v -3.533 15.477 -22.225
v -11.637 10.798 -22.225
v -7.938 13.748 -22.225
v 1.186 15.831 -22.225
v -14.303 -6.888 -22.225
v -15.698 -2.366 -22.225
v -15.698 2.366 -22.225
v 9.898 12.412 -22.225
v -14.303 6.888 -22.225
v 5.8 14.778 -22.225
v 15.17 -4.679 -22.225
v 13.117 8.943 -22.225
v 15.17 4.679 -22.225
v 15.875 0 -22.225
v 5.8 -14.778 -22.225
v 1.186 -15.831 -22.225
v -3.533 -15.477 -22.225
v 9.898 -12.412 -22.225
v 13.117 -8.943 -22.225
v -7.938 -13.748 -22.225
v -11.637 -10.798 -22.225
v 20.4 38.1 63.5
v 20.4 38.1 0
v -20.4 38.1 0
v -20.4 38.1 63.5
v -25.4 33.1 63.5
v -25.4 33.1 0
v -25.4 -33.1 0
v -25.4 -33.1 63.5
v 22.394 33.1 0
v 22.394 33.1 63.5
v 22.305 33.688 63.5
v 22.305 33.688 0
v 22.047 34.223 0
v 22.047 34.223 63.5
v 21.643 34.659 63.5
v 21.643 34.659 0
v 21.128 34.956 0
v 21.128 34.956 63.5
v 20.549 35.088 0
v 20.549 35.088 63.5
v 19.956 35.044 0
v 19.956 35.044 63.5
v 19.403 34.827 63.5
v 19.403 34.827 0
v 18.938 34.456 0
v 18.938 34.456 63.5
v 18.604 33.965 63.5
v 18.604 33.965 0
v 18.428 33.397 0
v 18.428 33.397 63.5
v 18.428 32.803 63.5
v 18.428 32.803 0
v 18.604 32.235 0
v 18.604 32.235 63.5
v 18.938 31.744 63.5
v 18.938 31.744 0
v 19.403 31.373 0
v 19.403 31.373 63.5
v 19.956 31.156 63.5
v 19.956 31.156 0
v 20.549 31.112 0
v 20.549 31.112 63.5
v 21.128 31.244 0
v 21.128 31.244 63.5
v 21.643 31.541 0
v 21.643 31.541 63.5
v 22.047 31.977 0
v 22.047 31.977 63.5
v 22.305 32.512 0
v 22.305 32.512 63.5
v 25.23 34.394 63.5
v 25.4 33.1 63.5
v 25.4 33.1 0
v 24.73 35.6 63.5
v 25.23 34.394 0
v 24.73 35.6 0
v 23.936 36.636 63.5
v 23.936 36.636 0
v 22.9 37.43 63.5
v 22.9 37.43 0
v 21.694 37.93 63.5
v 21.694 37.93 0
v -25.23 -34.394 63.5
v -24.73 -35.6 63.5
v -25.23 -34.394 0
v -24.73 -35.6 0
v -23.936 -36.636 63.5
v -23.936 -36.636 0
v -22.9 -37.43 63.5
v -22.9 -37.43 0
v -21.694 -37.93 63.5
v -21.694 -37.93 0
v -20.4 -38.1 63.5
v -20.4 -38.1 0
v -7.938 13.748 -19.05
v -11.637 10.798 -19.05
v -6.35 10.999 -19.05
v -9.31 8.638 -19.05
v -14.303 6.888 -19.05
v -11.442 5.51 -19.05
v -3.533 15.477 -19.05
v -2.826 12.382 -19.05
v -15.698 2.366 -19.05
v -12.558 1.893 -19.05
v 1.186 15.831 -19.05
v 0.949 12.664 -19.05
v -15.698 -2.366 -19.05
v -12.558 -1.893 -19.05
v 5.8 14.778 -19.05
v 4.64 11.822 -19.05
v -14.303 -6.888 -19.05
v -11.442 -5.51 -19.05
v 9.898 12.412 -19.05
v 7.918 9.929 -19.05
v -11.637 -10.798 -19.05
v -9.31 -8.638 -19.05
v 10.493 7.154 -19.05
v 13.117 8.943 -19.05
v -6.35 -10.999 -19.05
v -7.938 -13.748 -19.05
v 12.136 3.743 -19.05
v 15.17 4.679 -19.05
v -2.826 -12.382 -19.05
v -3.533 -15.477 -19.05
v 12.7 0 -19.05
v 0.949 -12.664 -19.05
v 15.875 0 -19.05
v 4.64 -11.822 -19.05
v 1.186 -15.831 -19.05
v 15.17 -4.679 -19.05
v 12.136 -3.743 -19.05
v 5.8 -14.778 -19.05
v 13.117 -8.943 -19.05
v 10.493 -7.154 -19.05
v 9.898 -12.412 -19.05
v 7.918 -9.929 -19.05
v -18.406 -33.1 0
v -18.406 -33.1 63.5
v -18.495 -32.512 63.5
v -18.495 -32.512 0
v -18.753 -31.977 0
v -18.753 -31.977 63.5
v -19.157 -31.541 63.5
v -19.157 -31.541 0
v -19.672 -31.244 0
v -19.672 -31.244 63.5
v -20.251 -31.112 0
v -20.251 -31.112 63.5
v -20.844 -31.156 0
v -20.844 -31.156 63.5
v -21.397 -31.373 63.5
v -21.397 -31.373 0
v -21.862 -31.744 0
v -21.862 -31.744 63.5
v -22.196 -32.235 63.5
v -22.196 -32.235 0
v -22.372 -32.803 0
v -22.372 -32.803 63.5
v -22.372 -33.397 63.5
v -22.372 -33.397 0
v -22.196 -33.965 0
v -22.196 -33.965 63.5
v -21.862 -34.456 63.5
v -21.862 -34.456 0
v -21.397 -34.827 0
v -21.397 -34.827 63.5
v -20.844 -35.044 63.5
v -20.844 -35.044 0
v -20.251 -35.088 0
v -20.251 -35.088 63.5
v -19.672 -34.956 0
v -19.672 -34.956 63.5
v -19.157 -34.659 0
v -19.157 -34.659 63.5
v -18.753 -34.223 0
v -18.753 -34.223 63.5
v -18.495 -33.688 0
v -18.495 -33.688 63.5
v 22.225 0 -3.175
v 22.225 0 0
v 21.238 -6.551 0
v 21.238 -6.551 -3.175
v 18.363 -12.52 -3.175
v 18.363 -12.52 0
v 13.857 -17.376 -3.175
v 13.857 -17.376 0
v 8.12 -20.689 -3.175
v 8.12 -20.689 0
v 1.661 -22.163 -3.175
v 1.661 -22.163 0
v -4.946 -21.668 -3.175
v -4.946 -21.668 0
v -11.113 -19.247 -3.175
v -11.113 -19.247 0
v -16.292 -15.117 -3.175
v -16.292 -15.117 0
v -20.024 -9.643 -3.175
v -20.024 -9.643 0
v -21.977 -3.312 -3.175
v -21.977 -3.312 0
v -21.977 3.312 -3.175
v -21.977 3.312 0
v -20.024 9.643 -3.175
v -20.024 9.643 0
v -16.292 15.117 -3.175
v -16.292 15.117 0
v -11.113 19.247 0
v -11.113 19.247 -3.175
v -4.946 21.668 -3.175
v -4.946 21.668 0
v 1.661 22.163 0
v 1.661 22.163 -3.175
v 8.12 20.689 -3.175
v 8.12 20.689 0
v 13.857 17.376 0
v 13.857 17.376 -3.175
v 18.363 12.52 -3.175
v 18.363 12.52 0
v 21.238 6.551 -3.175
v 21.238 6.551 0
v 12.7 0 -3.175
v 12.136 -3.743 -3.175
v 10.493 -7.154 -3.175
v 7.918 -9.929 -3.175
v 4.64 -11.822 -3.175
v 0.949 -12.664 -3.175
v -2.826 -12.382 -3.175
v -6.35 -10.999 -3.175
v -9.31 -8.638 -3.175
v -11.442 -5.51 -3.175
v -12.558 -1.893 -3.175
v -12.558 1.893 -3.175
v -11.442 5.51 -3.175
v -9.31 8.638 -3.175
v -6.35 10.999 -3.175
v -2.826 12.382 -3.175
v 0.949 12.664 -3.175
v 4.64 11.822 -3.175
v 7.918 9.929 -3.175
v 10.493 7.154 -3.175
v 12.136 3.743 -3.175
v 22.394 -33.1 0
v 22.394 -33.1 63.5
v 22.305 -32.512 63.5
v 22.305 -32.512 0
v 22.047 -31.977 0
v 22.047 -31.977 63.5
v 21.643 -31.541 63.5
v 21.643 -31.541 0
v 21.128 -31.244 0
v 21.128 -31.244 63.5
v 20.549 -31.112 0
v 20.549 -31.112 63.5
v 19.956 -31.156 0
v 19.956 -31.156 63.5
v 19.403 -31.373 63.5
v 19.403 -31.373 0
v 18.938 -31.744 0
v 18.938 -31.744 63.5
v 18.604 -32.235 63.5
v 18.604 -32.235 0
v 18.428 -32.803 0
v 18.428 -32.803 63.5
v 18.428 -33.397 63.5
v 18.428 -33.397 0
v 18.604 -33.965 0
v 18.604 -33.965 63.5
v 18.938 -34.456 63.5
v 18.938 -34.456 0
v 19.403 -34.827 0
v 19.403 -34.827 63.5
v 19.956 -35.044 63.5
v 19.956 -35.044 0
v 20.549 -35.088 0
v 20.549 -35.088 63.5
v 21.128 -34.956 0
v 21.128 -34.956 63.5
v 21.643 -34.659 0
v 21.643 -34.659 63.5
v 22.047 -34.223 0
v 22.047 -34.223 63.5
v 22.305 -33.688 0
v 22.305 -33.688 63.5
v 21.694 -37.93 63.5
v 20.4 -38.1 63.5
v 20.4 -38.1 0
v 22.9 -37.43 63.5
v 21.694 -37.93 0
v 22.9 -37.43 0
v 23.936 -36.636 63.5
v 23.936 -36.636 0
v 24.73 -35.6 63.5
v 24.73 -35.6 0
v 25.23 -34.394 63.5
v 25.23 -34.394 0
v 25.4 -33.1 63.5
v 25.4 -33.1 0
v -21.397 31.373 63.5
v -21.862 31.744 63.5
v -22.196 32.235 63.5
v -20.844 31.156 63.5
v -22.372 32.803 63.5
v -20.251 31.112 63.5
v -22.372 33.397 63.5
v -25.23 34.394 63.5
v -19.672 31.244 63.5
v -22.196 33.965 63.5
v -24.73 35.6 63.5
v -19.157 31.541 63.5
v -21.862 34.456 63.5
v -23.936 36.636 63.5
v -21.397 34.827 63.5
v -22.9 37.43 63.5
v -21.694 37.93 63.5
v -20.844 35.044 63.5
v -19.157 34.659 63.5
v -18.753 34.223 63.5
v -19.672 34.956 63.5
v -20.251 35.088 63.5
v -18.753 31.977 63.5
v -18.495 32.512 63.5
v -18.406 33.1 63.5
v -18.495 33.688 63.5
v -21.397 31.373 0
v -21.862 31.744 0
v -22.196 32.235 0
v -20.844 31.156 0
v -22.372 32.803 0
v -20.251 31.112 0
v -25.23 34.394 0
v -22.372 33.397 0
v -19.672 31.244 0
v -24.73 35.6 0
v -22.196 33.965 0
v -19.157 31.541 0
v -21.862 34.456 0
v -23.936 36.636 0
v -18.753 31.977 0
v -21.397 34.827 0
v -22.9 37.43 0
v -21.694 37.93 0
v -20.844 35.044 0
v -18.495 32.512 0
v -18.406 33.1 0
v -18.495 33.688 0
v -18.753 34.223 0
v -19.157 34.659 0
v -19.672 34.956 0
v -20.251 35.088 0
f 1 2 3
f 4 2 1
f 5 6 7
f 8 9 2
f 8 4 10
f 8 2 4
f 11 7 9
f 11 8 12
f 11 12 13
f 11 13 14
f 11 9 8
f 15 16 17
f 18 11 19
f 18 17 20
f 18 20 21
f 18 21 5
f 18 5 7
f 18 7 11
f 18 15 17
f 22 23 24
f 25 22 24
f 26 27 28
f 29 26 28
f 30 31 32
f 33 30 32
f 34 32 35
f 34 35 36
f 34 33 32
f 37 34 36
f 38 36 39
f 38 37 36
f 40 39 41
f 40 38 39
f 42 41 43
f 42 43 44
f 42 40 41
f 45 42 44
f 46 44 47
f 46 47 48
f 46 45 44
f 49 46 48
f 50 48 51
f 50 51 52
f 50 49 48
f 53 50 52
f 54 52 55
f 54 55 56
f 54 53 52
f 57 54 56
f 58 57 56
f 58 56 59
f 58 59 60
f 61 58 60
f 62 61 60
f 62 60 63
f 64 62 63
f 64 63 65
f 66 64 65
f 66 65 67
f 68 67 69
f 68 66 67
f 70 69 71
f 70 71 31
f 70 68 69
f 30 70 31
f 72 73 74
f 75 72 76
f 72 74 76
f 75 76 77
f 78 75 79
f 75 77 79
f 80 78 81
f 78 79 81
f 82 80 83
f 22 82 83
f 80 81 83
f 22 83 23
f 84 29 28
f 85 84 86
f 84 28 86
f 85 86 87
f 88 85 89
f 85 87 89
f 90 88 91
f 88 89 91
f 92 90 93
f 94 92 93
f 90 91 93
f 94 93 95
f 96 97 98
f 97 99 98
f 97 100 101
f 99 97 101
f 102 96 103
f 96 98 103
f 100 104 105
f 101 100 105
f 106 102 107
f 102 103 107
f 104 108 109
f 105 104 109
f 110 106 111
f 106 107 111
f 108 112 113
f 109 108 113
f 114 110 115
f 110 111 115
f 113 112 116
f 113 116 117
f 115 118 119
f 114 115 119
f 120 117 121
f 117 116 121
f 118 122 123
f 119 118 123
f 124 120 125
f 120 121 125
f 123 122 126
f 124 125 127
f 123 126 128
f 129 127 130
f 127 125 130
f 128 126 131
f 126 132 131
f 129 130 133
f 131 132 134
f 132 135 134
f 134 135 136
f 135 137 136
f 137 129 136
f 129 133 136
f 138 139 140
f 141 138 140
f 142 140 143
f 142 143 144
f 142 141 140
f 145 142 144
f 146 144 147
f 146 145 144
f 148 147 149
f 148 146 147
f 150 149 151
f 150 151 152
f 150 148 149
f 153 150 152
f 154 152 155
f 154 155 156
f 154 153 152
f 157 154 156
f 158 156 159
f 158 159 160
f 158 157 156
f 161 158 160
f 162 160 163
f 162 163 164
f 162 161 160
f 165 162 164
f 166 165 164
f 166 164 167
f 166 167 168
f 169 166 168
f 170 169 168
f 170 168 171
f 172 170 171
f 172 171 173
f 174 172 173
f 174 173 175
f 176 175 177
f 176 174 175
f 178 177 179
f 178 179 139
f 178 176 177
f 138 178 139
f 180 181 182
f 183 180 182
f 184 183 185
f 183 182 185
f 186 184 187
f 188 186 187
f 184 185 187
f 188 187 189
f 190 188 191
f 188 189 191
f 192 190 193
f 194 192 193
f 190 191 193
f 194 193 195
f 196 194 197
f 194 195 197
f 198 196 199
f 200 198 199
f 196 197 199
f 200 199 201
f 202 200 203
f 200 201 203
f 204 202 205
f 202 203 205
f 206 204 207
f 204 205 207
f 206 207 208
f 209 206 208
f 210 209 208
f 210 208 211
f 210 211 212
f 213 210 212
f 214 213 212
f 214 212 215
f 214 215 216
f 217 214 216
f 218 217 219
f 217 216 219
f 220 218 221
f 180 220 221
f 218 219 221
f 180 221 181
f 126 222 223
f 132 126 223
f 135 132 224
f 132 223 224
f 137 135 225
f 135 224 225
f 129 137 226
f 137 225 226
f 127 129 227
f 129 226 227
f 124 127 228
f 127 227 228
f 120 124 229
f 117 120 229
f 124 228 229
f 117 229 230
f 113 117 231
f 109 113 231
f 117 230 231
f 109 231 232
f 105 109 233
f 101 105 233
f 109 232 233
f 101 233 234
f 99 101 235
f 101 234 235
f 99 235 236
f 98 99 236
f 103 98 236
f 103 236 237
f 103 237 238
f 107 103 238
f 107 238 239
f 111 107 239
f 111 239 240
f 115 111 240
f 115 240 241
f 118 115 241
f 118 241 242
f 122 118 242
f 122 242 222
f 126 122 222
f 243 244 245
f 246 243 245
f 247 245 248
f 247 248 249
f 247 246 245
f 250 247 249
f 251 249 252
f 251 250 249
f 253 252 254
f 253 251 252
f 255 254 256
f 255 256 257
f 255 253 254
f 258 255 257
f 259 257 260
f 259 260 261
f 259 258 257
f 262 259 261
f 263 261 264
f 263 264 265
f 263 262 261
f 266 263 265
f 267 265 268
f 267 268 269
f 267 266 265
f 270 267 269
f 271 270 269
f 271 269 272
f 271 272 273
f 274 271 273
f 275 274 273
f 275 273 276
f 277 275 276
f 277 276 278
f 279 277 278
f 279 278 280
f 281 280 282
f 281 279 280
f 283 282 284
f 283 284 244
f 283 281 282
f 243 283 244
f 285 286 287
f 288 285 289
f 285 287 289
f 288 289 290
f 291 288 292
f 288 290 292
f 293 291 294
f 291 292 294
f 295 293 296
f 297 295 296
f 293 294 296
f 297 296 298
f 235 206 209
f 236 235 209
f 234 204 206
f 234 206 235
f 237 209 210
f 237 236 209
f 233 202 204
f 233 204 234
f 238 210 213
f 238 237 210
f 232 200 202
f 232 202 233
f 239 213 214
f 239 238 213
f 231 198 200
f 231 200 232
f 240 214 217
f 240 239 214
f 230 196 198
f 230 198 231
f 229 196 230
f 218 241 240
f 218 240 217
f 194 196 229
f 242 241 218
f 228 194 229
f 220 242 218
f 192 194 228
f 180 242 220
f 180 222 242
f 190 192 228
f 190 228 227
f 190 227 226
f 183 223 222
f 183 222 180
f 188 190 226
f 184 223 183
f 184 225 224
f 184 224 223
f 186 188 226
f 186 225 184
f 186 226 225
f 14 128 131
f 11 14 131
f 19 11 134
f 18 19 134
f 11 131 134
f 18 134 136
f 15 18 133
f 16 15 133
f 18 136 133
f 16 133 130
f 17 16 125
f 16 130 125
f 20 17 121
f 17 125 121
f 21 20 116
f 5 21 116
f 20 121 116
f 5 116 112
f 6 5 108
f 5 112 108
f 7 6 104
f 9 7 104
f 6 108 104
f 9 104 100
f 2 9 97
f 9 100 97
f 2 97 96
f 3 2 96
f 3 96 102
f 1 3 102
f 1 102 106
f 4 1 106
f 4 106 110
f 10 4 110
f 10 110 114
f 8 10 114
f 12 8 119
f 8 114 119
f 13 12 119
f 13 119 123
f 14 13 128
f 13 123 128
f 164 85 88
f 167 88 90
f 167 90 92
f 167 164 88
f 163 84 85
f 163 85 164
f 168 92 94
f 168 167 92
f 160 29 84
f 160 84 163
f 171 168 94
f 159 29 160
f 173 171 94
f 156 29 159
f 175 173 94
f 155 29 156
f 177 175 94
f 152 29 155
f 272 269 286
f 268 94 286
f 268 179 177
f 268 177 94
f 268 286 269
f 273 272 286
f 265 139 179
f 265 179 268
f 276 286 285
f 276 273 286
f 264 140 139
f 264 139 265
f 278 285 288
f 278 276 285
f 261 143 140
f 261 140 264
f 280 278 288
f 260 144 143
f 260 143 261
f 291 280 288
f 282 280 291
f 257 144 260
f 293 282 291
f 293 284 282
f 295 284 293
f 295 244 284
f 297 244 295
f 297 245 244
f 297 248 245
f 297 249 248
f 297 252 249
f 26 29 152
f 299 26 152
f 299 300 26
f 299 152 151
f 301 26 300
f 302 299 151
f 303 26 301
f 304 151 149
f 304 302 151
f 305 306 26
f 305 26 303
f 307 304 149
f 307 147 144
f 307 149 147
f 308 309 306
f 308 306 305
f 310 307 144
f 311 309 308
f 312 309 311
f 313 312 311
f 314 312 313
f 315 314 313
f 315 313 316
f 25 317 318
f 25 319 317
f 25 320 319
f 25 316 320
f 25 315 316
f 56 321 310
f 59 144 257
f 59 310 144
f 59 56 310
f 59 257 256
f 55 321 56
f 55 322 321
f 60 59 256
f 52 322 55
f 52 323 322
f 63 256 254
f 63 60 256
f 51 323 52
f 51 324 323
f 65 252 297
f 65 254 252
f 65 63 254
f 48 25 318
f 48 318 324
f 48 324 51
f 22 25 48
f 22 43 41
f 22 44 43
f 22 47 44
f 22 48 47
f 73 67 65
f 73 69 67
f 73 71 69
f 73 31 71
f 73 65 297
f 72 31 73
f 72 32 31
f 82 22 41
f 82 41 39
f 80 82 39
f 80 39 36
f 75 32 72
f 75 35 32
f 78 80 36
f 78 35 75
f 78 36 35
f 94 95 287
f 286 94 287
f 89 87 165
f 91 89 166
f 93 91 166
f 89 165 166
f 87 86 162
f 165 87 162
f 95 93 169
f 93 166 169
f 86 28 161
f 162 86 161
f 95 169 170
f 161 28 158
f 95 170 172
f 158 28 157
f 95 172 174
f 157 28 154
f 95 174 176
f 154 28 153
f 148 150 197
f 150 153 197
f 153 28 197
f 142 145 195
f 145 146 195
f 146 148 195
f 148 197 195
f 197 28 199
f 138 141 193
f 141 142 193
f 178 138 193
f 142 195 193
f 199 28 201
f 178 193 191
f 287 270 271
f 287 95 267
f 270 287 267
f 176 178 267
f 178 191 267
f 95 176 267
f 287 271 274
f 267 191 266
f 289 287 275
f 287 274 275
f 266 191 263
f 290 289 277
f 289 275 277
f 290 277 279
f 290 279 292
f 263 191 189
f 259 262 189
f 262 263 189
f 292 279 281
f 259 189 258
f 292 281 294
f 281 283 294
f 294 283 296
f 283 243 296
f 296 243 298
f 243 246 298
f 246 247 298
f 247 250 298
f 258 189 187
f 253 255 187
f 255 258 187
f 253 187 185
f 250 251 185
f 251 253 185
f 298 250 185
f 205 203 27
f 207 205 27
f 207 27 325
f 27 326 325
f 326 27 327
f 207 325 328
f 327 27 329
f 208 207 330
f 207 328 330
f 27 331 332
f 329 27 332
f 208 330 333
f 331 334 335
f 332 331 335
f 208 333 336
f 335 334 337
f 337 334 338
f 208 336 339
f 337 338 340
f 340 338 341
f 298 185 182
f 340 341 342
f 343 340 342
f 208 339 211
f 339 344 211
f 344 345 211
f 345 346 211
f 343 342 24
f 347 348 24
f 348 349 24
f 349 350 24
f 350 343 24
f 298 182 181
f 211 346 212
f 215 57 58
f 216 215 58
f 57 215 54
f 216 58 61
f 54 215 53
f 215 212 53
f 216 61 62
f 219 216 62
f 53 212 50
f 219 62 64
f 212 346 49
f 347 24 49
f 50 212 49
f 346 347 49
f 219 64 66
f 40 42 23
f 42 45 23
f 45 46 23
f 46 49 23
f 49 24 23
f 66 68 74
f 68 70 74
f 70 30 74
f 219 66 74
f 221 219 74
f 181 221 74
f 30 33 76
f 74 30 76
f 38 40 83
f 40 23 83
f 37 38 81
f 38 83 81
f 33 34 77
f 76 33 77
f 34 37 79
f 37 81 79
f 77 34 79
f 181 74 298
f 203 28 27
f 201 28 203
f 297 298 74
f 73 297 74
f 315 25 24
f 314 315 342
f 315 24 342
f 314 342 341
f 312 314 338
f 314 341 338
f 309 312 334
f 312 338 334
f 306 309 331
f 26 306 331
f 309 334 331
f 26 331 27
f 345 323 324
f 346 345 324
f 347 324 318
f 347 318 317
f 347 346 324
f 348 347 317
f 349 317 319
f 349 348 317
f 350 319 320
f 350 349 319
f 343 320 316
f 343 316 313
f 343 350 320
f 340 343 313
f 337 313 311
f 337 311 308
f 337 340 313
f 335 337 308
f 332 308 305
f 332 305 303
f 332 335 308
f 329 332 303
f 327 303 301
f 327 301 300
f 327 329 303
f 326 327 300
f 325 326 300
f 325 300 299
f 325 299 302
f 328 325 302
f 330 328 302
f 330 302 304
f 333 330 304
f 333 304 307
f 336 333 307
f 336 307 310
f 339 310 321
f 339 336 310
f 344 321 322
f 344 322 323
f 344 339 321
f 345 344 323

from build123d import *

# Parameters (mm, degrees)
F0_R     = 1.9939
F1_DEPTH = 63.5
F2_R     = 12.7
F3_DEPTH = 19.05
F4_R     = 22.225
F5_DEPTH = 3.175
F6_R     = 15.875
F7_DEPTH = 3.175


with BuildPart() as f1:
    # F0 (on Top) → F1 (new body)
    with BuildSketch(Plane.XY):
        with BuildLine():
            ThreePointArc((-25.4, -33.1), (-23.935534, -36.635534), (-20.4, -38.1))
            Line((-20.4, -38.1), (20.4, -38.1))
            ThreePointArc((20.4, -38.1), (23.935534, -36.635534), (25.4, -33.1))
            Line((25.4, -33.1), (25.4, 33.1))
            ThreePointArc((25.4, 33.1), (23.935534, 36.635534), (20.4, 38.1))
            Line((20.4, 38.1), (-20.4, 38.1))
            ThreePointArc((-20.4, 38.1), (-23.935534, 36.635534), (-25.4, 33.1))
            Line((-25.4, 33.1), (-25.4, -33.1))
        make_face()
        with Locations((-20.4, -33.1)):
            Circle(F0_R, mode=Mode.SUBTRACT)
        with Locations((20.4, -33.1)):
            Circle(F0_R, mode=Mode.SUBTRACT)
        with Locations((-20.4, 33.1)):
            Circle(F0_R, mode=Mode.SUBTRACT)
        with Locations((20.4, 33.1)):
            Circle(F0_R, mode=Mode.SUBTRACT)
    extrude(amount=F1_DEPTH)

    # F2 (on face) → F3 (join)
    with BuildSketch(Plane(origin=(0, 0, 0), x_dir=(1, 0, 0), z_dir=(0, 0, -1))):
        Circle(F2_R)
    extrude(amount=F3_DEPTH)

    # F4 (on face) → F5 (join)
    with BuildSketch(Plane(origin=(0, 0, 0), x_dir=(1, 0, 0), z_dir=(0, 0, -1))):
        Circle(F4_R)
    extrude(amount=F5_DEPTH)

    # F6 (on face) → F7 (join)
    with BuildSketch(Plane(origin=(0, 0, -19.05), x_dir=(1, 0, 0), z_dir=(0, 0, -1))):
        Circle(F6_R)
    extrude(amount=F7_DEPTH)


solid = f1.part
